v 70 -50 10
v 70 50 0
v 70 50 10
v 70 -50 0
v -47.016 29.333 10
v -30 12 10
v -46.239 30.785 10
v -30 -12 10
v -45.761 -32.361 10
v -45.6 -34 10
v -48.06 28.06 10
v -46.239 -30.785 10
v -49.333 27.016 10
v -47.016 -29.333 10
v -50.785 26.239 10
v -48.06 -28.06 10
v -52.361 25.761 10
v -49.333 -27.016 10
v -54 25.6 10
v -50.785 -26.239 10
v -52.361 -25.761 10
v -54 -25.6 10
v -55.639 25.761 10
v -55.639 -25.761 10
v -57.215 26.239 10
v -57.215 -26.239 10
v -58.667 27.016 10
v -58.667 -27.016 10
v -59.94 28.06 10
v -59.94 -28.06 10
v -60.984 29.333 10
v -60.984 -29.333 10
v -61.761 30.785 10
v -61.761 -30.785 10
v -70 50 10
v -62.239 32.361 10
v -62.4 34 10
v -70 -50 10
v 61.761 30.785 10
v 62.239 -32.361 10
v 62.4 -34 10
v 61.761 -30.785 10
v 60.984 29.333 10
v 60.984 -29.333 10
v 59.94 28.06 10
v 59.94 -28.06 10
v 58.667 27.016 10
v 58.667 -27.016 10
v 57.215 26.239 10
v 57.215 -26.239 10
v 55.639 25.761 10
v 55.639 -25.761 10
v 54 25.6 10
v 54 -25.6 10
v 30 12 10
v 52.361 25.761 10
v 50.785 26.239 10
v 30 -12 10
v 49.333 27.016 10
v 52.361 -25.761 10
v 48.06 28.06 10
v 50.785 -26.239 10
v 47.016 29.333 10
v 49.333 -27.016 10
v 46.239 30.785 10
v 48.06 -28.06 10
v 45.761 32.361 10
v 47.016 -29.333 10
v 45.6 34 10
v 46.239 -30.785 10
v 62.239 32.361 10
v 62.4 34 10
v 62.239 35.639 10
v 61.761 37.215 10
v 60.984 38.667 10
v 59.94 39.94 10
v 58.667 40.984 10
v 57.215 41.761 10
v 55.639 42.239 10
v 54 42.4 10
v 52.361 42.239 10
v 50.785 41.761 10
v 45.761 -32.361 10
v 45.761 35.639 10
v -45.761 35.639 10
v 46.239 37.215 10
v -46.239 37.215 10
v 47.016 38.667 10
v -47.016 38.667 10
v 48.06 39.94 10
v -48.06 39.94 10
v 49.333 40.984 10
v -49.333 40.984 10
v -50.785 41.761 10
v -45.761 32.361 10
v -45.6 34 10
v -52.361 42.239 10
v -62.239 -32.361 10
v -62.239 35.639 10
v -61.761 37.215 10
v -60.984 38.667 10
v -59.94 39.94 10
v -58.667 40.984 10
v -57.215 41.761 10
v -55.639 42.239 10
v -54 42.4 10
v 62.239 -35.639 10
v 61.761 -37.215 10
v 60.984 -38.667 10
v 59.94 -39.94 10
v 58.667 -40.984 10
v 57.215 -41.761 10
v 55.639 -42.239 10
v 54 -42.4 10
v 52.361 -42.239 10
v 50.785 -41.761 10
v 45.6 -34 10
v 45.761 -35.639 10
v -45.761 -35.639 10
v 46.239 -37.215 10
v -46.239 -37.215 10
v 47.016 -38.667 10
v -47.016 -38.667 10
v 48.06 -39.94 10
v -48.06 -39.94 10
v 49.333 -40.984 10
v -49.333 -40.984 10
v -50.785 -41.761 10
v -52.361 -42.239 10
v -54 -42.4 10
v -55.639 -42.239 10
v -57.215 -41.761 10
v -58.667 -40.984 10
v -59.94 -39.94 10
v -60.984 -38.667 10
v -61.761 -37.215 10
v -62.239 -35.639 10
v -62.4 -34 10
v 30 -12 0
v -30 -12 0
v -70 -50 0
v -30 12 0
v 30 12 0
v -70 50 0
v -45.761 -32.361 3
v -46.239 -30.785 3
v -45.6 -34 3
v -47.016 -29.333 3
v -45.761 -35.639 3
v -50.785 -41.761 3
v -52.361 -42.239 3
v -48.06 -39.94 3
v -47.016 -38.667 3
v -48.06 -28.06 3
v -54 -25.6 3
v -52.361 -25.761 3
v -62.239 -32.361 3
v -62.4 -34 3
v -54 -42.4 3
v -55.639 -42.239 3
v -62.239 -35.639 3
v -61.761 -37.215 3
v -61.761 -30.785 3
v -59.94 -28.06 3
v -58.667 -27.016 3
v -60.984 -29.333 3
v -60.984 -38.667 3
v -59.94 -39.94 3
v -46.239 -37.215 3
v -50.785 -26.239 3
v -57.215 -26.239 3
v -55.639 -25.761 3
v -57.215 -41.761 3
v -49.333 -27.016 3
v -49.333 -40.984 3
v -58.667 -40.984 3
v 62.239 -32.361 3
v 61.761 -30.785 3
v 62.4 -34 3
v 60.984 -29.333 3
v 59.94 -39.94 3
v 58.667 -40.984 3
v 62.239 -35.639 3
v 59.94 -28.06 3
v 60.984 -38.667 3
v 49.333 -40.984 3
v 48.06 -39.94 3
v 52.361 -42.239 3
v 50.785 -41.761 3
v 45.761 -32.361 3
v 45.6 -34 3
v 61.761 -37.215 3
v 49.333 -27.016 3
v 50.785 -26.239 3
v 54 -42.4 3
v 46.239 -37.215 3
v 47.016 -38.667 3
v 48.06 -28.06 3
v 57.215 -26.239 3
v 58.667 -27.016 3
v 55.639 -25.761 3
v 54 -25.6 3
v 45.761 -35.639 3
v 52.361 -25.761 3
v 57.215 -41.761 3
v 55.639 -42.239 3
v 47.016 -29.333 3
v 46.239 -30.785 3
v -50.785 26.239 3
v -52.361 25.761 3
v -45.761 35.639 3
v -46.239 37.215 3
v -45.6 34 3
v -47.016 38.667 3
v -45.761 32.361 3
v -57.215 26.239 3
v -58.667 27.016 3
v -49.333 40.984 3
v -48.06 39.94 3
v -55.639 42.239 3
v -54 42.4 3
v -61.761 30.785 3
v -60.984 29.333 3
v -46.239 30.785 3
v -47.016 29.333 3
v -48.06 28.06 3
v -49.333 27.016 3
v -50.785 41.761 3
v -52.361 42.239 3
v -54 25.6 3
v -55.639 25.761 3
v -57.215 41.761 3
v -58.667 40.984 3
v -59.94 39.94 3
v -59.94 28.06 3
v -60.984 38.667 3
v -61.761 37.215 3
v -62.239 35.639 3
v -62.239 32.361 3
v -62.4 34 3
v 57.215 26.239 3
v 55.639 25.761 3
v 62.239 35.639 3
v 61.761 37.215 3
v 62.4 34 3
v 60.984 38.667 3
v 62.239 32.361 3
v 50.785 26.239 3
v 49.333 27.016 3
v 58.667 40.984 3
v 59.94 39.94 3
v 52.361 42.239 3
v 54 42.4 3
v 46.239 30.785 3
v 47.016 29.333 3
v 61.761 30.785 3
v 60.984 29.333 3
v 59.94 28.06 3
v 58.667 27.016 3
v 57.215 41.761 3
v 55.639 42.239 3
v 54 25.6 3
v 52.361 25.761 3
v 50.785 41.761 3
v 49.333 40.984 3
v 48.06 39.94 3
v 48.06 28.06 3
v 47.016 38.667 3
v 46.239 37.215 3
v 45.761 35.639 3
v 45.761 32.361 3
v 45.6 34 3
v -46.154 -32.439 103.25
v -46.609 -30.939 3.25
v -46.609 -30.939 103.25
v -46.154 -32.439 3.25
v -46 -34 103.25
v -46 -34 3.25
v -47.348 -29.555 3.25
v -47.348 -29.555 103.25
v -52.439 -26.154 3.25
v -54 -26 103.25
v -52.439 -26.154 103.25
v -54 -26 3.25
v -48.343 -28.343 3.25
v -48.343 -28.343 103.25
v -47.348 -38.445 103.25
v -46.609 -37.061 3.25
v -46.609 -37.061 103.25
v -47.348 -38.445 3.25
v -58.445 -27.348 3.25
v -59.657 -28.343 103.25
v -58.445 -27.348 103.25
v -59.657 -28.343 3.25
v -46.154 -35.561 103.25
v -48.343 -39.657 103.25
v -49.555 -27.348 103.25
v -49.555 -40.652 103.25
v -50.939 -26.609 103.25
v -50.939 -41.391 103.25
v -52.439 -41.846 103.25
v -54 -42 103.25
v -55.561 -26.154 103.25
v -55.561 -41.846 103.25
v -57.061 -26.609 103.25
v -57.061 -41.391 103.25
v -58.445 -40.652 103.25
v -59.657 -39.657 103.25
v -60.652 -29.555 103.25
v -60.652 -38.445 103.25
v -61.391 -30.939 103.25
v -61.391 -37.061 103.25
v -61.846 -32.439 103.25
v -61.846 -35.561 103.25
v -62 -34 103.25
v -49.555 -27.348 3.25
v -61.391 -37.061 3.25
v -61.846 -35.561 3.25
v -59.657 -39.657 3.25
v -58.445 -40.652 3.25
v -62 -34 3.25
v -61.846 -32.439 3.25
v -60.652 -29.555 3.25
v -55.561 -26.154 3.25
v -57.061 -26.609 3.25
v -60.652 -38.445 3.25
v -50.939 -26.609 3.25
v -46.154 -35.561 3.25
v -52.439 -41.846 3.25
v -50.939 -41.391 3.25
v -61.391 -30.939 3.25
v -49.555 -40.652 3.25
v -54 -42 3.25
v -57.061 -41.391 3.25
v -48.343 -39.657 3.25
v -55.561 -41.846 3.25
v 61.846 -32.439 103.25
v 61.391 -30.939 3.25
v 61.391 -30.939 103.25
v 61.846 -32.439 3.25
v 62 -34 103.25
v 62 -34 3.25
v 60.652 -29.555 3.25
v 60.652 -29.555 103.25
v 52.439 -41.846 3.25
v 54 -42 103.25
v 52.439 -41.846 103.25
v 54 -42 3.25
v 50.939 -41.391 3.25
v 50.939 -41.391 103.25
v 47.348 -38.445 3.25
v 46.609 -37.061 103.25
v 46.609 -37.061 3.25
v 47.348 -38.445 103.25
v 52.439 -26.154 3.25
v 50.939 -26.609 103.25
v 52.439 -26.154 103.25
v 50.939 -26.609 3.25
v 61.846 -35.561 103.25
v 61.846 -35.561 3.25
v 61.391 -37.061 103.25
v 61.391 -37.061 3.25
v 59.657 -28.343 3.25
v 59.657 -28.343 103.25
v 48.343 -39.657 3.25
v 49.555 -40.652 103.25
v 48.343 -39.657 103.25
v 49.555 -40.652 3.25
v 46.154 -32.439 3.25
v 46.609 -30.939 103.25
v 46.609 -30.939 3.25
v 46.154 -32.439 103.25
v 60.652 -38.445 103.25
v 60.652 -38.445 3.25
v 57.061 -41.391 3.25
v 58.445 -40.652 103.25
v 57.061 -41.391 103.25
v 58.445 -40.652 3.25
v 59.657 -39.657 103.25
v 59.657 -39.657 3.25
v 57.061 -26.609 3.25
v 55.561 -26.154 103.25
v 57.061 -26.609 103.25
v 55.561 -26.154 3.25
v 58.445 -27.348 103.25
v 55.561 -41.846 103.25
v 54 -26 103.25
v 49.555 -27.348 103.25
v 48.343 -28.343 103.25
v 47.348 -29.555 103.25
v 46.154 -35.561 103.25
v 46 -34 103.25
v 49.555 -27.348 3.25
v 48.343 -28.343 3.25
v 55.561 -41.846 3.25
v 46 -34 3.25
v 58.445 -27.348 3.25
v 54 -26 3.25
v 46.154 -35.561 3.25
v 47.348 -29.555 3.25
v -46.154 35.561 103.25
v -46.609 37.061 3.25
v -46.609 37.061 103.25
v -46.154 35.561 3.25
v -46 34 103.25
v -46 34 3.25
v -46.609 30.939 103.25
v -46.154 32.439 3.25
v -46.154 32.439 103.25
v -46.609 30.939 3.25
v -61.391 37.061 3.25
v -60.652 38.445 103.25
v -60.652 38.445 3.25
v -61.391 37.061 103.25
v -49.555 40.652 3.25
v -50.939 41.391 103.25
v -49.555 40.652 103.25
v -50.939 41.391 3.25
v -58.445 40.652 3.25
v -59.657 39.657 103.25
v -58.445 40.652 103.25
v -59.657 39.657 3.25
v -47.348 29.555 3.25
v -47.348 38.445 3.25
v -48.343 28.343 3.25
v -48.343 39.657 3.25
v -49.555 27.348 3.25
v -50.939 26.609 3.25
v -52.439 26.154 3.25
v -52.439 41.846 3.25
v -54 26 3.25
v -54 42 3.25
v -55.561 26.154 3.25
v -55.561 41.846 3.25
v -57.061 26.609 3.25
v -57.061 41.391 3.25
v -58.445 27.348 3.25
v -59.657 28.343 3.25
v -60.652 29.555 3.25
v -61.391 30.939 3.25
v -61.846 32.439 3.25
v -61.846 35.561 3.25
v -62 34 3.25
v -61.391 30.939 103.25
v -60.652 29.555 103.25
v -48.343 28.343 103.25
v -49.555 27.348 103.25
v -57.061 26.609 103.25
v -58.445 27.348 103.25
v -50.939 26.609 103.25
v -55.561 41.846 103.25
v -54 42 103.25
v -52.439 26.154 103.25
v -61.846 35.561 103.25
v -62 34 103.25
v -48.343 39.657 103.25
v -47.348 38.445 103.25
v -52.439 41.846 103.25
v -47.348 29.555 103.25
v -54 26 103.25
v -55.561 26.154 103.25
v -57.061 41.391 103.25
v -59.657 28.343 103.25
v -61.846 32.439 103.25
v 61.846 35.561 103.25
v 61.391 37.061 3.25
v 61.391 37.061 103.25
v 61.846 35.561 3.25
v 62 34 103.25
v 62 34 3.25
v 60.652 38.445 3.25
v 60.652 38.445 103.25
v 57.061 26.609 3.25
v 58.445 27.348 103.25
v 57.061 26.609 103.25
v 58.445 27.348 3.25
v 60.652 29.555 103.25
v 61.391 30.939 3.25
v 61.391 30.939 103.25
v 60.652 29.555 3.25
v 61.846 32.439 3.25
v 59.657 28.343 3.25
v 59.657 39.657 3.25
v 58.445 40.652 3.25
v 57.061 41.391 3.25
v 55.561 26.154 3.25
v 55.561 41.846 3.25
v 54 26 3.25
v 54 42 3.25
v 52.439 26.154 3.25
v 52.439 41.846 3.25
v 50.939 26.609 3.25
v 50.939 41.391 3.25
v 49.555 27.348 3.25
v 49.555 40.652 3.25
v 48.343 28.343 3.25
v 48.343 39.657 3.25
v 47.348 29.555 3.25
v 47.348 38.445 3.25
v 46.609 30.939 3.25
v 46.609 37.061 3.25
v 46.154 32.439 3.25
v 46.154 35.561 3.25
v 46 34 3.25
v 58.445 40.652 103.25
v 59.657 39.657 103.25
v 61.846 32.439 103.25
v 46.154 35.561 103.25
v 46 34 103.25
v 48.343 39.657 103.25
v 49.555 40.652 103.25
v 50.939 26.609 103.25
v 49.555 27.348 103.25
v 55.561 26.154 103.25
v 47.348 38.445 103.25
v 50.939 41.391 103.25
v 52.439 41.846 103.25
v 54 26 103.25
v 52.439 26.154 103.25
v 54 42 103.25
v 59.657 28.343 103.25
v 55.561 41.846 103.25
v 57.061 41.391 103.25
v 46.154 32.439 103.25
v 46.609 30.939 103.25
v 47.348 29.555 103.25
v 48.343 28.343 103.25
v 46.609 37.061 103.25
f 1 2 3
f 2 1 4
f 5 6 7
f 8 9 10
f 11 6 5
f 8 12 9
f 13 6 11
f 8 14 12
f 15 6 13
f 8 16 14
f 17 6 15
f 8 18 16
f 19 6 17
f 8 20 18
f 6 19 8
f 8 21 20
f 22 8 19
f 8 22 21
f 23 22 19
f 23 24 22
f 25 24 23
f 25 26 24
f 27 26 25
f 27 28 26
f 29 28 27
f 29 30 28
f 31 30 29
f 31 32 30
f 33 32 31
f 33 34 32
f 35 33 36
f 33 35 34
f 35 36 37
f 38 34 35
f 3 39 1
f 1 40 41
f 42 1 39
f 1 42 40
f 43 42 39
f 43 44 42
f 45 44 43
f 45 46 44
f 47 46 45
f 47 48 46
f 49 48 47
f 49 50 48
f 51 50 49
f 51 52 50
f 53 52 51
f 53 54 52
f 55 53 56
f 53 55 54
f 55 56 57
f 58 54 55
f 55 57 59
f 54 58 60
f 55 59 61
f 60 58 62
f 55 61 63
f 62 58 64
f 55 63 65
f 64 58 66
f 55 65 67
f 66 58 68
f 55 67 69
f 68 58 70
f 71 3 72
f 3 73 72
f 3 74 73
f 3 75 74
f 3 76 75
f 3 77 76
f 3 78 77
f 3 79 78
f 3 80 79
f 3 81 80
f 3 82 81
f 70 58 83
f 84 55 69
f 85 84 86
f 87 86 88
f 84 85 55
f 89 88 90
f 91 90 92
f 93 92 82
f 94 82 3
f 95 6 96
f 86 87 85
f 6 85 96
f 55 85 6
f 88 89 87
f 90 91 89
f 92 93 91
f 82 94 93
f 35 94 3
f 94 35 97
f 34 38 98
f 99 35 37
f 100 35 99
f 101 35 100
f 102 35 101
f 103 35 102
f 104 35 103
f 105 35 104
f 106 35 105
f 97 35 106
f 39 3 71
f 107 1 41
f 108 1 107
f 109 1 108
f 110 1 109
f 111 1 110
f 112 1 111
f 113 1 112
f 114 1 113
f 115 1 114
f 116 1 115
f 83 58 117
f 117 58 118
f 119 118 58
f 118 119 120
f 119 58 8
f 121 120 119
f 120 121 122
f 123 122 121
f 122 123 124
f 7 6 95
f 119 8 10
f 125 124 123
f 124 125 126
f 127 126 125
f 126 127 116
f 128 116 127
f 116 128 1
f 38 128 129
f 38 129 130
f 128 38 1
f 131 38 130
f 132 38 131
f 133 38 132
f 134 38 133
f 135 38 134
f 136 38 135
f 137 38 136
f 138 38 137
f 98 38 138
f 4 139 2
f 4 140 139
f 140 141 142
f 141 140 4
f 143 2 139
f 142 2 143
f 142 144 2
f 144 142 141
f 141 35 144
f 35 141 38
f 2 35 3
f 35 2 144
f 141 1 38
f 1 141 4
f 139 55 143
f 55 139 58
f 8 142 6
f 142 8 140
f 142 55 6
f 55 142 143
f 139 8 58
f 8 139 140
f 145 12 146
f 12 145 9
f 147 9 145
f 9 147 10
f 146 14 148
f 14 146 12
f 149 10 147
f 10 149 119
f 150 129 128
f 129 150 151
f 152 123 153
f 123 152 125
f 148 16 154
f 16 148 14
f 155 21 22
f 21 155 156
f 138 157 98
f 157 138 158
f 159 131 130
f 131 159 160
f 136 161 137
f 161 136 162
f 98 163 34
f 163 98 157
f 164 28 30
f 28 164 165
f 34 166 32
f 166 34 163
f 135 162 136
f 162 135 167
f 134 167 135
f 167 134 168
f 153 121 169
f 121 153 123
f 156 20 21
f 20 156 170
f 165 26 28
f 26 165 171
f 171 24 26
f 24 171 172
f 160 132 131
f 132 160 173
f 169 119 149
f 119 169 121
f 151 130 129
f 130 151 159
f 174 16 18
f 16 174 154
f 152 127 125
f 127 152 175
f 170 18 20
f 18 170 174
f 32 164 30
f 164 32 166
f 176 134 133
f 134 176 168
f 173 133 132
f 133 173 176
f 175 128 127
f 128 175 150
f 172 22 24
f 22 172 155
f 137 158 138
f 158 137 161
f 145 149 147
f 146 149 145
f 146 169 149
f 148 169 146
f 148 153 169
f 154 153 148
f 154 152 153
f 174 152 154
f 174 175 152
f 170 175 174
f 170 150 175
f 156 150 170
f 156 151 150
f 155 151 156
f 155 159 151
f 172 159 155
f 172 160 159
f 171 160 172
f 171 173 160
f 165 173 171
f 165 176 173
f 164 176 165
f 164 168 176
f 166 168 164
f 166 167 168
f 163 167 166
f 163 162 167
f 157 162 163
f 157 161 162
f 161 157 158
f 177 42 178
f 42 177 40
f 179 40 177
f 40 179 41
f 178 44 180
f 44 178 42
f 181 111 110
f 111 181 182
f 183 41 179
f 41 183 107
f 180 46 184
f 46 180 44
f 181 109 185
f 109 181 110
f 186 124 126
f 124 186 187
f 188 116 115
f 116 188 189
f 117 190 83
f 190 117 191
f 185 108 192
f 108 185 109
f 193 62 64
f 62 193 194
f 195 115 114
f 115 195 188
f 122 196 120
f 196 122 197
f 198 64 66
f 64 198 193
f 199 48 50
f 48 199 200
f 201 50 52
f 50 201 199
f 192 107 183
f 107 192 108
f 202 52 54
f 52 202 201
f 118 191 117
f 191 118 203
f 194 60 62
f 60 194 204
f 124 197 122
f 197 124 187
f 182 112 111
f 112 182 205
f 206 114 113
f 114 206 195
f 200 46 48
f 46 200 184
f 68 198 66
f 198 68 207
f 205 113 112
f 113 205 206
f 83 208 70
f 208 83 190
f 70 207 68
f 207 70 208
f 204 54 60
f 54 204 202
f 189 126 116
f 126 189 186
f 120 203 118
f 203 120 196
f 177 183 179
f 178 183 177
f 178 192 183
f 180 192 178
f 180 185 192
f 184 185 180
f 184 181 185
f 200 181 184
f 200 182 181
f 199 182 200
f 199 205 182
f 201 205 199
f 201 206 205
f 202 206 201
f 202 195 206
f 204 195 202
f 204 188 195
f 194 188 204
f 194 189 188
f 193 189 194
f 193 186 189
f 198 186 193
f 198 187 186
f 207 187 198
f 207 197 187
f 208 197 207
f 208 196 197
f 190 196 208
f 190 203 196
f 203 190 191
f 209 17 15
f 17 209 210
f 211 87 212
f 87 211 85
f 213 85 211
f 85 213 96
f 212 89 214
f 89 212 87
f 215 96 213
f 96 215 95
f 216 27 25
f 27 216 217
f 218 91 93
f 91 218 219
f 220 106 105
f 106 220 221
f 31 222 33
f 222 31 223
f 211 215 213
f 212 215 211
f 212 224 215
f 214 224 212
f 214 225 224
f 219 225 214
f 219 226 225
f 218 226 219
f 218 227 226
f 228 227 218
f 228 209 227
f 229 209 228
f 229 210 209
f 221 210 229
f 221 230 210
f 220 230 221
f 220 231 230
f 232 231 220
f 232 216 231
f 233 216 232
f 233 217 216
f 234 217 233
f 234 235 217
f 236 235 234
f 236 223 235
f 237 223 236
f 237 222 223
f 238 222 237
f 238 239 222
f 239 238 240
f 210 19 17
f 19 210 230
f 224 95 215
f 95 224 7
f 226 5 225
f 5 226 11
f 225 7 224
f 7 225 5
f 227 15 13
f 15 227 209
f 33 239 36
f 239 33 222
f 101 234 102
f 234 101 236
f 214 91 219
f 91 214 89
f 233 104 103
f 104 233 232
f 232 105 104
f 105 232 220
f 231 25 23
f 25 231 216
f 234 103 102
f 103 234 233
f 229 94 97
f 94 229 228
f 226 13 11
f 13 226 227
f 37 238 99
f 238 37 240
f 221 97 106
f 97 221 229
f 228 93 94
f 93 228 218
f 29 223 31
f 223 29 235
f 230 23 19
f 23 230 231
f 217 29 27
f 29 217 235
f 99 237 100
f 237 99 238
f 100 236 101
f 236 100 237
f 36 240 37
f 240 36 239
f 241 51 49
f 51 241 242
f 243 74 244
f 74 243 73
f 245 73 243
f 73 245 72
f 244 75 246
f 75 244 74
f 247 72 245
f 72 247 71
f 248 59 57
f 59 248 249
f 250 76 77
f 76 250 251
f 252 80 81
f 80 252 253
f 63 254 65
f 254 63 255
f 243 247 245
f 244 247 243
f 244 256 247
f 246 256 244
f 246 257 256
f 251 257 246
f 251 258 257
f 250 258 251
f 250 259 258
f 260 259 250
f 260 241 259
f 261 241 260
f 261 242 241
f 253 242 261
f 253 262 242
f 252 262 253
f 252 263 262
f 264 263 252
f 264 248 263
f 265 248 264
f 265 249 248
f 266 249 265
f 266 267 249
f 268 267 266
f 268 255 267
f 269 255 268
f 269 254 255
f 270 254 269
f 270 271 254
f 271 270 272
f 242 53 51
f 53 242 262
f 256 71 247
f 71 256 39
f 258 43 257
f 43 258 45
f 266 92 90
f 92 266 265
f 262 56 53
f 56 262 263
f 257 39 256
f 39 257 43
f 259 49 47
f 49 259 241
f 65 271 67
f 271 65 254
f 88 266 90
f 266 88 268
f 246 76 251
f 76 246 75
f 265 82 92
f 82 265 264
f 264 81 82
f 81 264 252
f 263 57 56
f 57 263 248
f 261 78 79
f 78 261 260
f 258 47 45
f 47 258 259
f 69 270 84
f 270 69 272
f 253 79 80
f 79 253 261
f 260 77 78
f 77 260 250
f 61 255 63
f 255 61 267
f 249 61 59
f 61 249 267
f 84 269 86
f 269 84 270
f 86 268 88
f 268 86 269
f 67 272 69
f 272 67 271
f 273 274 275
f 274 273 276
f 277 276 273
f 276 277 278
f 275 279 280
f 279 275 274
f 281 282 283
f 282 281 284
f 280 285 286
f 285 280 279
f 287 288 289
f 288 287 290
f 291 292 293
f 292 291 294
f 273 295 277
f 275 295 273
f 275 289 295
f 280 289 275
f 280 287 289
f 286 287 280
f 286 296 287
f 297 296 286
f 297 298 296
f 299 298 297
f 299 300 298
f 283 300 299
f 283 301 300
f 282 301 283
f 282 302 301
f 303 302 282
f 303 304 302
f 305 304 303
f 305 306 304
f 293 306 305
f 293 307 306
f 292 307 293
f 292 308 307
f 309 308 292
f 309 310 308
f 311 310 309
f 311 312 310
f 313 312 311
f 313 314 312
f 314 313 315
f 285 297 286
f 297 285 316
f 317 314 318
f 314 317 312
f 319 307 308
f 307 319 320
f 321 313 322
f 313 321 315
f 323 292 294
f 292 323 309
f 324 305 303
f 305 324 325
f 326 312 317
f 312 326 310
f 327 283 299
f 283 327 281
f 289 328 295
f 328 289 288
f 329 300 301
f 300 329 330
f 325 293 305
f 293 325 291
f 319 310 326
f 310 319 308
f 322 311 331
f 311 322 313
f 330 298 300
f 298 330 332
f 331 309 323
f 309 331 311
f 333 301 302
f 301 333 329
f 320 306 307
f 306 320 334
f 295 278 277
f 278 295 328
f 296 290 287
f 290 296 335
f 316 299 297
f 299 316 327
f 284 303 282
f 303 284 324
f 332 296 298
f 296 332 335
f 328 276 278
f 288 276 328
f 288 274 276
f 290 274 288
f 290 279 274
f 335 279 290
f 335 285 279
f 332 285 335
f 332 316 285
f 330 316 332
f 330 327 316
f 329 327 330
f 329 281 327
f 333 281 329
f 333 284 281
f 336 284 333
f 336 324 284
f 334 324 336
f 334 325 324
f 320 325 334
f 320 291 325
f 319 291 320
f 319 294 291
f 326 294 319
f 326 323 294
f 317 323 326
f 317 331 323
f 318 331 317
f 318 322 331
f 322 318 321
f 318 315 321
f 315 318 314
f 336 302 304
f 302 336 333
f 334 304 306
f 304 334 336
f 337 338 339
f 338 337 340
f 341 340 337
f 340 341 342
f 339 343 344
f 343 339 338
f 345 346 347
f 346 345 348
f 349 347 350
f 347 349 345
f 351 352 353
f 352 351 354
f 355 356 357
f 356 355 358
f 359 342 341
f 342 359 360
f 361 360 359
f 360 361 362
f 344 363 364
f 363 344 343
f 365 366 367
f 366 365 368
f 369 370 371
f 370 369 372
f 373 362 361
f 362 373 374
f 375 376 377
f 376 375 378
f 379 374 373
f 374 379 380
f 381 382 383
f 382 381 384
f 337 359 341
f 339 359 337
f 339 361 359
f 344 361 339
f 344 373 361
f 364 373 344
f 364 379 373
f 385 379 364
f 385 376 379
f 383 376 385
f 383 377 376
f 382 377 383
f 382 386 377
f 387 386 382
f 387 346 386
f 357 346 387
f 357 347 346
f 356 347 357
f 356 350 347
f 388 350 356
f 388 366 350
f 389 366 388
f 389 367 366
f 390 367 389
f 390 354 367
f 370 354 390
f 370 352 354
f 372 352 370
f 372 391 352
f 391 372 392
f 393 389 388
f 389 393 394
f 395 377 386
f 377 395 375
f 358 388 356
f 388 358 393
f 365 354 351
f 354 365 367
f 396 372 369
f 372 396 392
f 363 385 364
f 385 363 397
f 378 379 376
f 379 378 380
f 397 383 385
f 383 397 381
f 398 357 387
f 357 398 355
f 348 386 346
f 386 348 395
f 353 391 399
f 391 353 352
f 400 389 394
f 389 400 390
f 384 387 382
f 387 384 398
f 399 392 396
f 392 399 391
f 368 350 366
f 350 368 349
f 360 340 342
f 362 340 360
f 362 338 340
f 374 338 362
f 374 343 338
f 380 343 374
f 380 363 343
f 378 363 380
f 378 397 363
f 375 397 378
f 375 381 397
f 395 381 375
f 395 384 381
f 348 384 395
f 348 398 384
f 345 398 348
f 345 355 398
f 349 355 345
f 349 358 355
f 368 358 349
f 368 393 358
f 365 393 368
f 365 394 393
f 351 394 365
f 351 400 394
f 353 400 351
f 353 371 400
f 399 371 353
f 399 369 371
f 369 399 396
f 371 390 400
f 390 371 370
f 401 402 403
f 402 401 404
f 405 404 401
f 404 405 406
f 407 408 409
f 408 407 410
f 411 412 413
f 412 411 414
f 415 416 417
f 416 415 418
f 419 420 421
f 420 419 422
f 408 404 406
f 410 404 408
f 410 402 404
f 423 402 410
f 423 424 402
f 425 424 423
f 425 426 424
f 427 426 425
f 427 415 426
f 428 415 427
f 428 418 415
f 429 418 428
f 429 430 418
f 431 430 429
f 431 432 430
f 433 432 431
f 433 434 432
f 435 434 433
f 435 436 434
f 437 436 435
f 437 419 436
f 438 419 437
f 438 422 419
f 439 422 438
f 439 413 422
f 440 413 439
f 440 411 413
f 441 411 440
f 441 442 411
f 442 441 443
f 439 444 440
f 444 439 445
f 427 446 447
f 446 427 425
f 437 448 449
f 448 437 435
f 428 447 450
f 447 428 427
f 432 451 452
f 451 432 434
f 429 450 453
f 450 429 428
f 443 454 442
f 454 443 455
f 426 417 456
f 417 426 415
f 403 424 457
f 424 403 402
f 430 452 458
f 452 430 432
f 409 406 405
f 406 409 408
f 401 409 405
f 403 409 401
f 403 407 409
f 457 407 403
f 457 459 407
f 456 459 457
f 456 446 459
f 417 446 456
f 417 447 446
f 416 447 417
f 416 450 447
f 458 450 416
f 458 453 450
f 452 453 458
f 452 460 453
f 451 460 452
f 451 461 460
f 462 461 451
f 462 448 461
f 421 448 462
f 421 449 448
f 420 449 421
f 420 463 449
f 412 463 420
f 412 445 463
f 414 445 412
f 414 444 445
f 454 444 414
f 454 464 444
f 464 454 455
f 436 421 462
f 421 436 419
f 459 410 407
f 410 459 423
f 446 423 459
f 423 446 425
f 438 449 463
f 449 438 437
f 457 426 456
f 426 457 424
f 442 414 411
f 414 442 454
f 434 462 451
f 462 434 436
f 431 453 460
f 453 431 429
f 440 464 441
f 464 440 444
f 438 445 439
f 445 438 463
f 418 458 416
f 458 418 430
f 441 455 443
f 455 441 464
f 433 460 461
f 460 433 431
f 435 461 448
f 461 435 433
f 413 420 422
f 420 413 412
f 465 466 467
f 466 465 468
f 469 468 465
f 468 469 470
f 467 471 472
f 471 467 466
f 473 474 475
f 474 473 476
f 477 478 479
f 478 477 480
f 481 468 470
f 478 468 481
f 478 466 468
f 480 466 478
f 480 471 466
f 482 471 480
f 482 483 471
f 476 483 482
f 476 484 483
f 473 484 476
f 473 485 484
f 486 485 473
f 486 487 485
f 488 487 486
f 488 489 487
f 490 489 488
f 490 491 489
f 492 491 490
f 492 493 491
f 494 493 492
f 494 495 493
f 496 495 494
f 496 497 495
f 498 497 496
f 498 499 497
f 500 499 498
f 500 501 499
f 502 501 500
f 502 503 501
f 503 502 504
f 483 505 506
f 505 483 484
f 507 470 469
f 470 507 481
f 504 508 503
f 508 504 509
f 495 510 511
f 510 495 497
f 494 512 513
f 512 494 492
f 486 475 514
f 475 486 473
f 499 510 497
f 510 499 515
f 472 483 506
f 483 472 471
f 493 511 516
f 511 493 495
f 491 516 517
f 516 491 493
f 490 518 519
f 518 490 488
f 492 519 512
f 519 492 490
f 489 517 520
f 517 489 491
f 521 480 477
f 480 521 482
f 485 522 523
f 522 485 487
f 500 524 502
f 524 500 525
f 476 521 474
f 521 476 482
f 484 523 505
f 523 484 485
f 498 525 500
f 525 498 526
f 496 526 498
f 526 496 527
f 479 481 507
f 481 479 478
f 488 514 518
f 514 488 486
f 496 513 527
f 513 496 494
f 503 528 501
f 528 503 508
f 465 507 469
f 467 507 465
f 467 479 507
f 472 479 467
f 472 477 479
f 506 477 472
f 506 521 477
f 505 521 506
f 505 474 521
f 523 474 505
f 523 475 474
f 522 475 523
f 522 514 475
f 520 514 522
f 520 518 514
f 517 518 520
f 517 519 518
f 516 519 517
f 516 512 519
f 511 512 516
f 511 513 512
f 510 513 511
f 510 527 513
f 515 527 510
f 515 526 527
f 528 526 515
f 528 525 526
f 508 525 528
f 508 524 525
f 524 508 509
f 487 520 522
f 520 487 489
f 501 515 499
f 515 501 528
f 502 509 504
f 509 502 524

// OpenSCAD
$fn = 32;

// ------------------------------------------------------------------------
// Frame with four posts: 140 x 100 mm frame, four d16 posts
// Every part is its own module, assembly() places them once.
// ------------------------------------------------------------------------

// --- part 1 ---
module base_frame() {
  difference() {
    translate([-70, -50, 0]) cube([140, 100, 10]);
    translate([-30, -12, -1]) cube([60, 24, 12]);
    translate([-54, -34, 3]) cylinder(h = 8, d = 16.8);
    translate([54, -34, 3]) cylinder(h = 8, d = 16.8);
    translate([-54, 34, 3]) cylinder(h = 8, d = 16.8);
    translate([54, 34, 3]) cylinder(h = 8, d = 16.8);
  }
}

// --- part 2 ---
module post1() {
  cylinder(h = 100, d = 16);
}

// --- part 3 ---
module post2() {
  cylinder(h = 100, d = 16);
}

// --- part 4 ---
module post3() {
  cylinder(h = 100, d = 16);
}

// --- part 5 ---
module post4() {
  cylinder(h = 100, d = 16);
}

// --- assembly ---
module assembly() {
  translate([0, 0, 0]) rotate([0, 0, 0]) base_frame();
  translate([-54, -34, 3.25]) rotate([0, 0, 0]) post1();
  translate([54, -34, 3.25]) rotate([0, 0, 0]) post2();
  translate([-54, 34, 3.25]) rotate([0, 0, 0]) post3();
  translate([54, 34, 3.25]) rotate([0, 0, 0]) post4();
}

assembly();
